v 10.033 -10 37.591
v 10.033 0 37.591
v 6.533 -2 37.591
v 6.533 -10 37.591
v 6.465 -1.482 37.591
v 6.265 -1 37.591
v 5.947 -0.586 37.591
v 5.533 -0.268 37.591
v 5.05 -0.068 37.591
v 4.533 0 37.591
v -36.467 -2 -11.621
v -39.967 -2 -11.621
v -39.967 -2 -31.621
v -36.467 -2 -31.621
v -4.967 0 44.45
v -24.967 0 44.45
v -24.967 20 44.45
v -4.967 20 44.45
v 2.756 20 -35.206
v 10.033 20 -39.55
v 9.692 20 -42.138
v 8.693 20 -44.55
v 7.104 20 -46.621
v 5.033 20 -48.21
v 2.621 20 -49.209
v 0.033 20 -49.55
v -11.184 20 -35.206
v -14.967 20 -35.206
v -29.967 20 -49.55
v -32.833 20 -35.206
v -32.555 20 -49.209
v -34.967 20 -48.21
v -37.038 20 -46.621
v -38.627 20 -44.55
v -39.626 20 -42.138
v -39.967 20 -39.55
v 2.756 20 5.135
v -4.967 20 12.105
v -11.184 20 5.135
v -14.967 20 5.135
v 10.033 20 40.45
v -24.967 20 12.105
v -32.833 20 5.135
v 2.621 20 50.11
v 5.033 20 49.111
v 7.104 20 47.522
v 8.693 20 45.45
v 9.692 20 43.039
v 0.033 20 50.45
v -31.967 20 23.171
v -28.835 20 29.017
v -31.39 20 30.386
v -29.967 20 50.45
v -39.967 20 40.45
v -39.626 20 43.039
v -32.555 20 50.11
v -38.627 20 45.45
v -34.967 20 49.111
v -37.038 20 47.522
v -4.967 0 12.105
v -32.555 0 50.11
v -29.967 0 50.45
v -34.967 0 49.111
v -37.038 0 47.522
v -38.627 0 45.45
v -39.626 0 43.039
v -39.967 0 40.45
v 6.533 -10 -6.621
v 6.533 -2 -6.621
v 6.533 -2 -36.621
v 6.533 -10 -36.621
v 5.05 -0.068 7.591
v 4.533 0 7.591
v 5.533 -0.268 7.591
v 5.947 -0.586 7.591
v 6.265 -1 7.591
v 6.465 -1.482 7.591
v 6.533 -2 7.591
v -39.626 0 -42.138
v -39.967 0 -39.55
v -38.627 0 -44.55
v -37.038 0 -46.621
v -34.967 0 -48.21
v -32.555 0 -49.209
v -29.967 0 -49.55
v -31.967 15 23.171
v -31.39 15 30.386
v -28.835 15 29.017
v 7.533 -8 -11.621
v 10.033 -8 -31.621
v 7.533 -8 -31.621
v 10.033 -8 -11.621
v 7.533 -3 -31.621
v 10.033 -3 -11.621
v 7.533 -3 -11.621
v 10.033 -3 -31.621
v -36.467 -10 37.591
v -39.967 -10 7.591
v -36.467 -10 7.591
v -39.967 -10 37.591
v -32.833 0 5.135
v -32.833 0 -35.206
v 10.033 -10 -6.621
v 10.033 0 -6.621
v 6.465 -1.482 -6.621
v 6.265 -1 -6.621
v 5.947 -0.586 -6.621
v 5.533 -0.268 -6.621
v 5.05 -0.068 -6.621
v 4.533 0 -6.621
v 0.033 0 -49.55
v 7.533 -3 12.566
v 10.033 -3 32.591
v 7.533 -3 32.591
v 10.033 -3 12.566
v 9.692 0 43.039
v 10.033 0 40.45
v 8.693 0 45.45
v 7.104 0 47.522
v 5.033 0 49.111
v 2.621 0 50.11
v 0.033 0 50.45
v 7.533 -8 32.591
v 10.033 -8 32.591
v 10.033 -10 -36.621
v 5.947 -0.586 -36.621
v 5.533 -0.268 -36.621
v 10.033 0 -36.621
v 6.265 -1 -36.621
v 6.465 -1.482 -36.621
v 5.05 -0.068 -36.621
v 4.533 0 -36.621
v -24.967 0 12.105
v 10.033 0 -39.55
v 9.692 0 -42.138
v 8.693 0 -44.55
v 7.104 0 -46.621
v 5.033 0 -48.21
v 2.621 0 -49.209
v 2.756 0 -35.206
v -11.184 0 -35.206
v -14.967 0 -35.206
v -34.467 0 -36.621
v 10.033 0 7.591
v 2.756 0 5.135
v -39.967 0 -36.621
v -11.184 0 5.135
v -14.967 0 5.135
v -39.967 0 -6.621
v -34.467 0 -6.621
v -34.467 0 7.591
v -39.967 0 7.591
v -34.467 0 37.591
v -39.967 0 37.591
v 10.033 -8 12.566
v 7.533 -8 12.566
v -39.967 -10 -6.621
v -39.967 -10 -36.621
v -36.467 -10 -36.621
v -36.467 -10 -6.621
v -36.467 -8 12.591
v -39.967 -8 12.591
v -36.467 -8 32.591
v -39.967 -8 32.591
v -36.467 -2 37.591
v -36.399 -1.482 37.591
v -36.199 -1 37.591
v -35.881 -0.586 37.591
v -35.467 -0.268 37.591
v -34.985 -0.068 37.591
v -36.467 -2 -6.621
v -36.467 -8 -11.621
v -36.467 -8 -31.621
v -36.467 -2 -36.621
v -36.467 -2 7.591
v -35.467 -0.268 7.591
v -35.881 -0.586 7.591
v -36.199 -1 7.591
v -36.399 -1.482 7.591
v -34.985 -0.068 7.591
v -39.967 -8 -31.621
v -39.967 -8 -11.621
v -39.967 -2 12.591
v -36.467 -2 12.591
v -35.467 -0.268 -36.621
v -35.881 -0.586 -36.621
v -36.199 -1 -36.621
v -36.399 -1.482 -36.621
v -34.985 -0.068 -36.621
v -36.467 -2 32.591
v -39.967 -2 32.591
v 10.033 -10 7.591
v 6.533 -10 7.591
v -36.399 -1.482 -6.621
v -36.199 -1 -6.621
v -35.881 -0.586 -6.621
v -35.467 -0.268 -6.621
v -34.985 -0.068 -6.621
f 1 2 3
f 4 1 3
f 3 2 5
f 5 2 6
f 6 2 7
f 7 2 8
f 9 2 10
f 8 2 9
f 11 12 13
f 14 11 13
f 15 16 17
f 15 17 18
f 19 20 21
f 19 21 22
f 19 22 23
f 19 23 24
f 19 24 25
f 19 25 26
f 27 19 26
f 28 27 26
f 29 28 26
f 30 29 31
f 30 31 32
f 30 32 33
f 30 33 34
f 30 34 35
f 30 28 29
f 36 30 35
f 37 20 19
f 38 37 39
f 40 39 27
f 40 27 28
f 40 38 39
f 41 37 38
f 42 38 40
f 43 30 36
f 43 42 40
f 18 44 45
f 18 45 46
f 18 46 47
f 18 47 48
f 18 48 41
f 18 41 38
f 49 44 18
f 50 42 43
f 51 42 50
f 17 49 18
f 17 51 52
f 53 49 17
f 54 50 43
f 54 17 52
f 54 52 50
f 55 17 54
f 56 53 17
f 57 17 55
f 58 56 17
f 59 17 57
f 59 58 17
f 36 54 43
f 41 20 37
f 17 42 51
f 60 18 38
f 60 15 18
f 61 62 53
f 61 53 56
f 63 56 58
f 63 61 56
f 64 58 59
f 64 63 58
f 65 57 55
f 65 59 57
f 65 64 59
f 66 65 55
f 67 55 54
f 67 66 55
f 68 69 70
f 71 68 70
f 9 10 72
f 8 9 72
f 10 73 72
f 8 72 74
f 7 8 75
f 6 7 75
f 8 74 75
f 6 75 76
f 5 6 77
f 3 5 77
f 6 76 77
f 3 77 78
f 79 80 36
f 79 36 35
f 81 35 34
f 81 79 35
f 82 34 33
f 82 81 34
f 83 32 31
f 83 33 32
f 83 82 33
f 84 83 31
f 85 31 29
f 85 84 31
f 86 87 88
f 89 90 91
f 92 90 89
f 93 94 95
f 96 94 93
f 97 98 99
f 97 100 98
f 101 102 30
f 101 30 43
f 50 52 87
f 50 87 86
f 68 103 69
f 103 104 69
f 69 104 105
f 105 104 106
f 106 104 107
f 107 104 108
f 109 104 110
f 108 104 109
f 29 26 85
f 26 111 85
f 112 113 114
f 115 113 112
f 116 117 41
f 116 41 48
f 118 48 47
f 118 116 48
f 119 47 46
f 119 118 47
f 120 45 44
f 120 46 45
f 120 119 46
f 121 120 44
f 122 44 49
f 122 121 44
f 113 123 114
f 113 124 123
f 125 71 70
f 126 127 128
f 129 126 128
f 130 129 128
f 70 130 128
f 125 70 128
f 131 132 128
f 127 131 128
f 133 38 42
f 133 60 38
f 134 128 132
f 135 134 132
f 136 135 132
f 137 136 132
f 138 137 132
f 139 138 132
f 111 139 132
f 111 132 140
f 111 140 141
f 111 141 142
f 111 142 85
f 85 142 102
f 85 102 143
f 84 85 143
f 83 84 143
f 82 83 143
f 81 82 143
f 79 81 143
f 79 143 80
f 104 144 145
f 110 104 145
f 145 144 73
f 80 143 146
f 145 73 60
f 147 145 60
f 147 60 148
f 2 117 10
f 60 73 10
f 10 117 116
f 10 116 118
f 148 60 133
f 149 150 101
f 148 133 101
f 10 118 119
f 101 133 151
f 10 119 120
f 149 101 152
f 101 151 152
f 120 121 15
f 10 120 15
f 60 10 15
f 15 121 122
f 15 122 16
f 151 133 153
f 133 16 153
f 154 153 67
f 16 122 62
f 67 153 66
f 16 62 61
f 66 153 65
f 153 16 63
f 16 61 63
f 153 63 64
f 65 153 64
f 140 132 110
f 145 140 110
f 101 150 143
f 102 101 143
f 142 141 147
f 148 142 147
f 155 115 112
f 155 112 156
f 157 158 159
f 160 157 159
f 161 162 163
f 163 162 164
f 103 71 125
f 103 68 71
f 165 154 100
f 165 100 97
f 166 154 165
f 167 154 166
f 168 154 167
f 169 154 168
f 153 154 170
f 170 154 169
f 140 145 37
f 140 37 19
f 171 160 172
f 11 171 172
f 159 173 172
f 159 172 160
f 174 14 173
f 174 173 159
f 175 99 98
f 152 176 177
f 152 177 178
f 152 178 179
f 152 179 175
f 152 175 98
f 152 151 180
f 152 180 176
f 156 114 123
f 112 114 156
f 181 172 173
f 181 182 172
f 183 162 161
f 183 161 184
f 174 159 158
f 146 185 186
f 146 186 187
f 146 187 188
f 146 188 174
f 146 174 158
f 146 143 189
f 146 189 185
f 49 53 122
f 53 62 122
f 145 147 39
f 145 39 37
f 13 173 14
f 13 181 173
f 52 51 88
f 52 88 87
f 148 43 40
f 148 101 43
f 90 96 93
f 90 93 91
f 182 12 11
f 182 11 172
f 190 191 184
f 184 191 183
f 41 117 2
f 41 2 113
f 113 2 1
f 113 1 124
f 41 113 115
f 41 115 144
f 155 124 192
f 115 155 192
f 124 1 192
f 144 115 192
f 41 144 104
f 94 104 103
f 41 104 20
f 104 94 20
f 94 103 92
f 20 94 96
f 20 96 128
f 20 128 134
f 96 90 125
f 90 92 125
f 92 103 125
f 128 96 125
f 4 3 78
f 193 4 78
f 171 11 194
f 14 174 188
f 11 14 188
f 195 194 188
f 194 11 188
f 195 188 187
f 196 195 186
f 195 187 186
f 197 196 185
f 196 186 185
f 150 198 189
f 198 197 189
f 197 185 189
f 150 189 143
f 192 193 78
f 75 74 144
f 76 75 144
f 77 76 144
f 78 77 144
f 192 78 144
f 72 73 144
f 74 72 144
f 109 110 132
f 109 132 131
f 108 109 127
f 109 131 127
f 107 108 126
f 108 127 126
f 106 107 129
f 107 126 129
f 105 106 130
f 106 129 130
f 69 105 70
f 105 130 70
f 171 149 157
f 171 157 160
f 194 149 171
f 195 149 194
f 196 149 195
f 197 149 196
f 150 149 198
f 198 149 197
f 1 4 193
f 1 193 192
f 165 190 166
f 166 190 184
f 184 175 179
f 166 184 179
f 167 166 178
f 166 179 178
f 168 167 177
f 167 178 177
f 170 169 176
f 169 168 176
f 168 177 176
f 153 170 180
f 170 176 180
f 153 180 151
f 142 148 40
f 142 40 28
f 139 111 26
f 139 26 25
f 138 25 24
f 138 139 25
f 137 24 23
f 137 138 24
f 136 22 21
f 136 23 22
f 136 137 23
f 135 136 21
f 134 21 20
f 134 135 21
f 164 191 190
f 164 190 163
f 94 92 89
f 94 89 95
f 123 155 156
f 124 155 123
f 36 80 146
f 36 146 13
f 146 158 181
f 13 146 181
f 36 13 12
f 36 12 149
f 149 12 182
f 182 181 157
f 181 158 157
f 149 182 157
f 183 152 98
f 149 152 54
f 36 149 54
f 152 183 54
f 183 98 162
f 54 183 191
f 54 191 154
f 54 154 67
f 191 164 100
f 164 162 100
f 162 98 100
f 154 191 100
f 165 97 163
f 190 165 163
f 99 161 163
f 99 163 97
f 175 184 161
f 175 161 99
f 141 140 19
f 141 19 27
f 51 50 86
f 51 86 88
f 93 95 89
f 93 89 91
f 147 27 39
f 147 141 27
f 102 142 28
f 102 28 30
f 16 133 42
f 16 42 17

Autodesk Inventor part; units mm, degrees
ref_plane "YZ Plane" through (0, 0, 0) normal (1, 0, 0) x (0, 1, 0)
ref_plane "XZ Plane" through (0, 0, 0) normal (0, 1, 0) x (-1, 0, 0)
ref_plane "XY Plane" through (0, 0, 0) normal (0, 0, 1) x (1, 0, 0)
sketch "Sketch1" plane through (0, 0, 0) normal (0, 1, 0) x (-1, 0, 0)
  line L0 (29.9672, 50.4505) -> (-0.0328, 50.4505)
  line L1 (-10.0328, 40.4505) -> (-10.0328, -39.5495)
  line L2 (-0.0328, -49.5495) -> (29.9672, -49.5495)
  line L3 (39.9672, -39.5495) -> (39.9672, 40.4505)
  line L4 (24.9672, 44.4505) -> (4.9672, 44.4505)
  line L5 (4.9672, 44.4505) -> (4.9672, 12.105)
  line L6 (4.9672, 12.105) -> (24.9672, 12.105)
  line L7 (24.9672, 12.105) -> (24.9672, 44.4505)
  line L8 (32.8329, 5.1351) -> (14.9672, 5.1351)
  line L9 (14.9672, 5.1351) -> (14.9672, -35.2063)
  line L10 (14.9672, -35.2063) -> (32.8329, -35.2063)
  line L11 (32.8329, -35.2063) -> (32.8329, 5.1351)
  line L12 (11.1837, 5.1351) -> (-2.7562, 5.1351)
  line L13 (-2.7562, 5.1351) -> (-2.7562, -35.2063)
  line L14 (-2.7562, -35.2063) -> (11.1837, -35.2063)
  line L15 (11.1837, -35.2063) -> (11.1837, 5.1351)
  arc A0 (-0.0328, 50.4505) -> (-10.0328, 40.4505) centre (-0.0328, 40.4505) ccw
  arc A1 (39.9672, 40.4505) -> (29.9672, 50.4505) centre (29.9672, 40.4505) ccw
  arc A2 (29.9672, -49.5495) -> (39.9672, -39.5495) centre (29.9672, -39.5495) ccw
  arc A3 (-10.0328, -39.5495) -> (-0.0328, -49.5495) centre (-0.0328, -39.5495) ccw
  point P0 (0, 0)
  point P1 (39.9672, 50.4505)
  point P2 (-10.0328, -49.5495)
  point P3 (39.9672, -49.5495)
  dimension "d1" = 100
  dimension "d2" = 50
  dimension "d3" = 15
  dimension "d4" = 15
  dimension "d6" = 6
  dimension "d7" = 10
  dimension "d8" = 10
  dimension "d9" = 10
  dimension "d10" = 10
extrude "Extrusion1" add sketch "Sketch1" along normal blind 20
sketch "Sketch2" plane through (0, 0, 0) normal (0, -1, 0) x (1, 0, 0)
  line L0 (10.0328, 40.4505) -> (10.0328, -39.5495) projected
  line L1 (10.0328, 37.5913) -> (6.5328, 37.5913)
  line L2 (6.5328, 37.5913) -> (6.5328, 7.5913)
  line L3 (6.5328, 7.5913) -> (10.0328, 7.5913)
  line L4 (10.0328, 7.5913) -> (10.0328, 37.5913)
  line L5 (10.0328, -6.6206) -> (6.5328, -6.6206)
  line L6 (6.5328, -6.6206) -> (6.5328, -36.6206)
  line L7 (6.5328, -36.6206) -> (10.0328, -36.6206)
  line L8 (10.0328, -36.6206) -> (10.0328, -6.6206)
  arc A0 (10.0328, 40.4505) -> (0.0328, 50.4505) centre (0.0328, 40.4505) ccw projected
  arc A1 (0.0328, -49.5495) -> (10.0328, -39.5495) centre (0.0328, -39.5495) ccw projected
  line L9 (-39.9672, -39.5495) -> (-39.9672, 40.4505) projected
  line L10 (-39.9672, 37.5913) -> (-36.4672, 37.5913)
  line L11 (-36.4672, 37.5913) -> (-36.4672, 7.5913)
  line L12 (-36.4672, 7.5913) -> (-39.9672, 7.5913)
  line L13 (-39.9672, 7.5913) -> (-39.9672, 37.5913)
  line L14 (-39.9672, -6.6206) -> (-36.4672, -6.6206)
  line L15 (-36.4672, -6.6206) -> (-36.4672, -36.6206)
  line L16 (-36.4672, -36.6206) -> (-39.9672, -36.6206)
  line L17 (-39.9672, -36.6206) -> (-39.9672, -6.6206)
  point P0 (0, 0)
  point P1 (7.1038, 47.5215)
  point P2 (8.2828, 37.5913)
  point P3 (7.1038, -46.6206)
  point P4 (8.2828, 7.5913)
  point P5 (-34.5818, 22.0482)
  point P6 (-38.0818, -7.9518)
  point P7 (-37.5107, 76.1904)
  point P8 (-36.4672, -21.6206)
  point P9 (-39.9672, -21.6206)
  dimension "d13" = 3.5
  dimension "d14" = 3.5
  dimension "d15" = 10
  dimension "d16" = 10
  dimension "d17" = 30
  dimension "d18" = 30
  dimension "d22" = 3.5
  dimension "d23" = 3.5
extrude "Extrusion2" add sketch "Sketch2" along normal blind 10
fillet "Fillet1" radius 2 4 edges at (6.5328, 0, 22.5913) (6.5328, 0, -21.6206) (-36.4672, 0, 22.5913) (-36.4672, 0, -21.6206)
sketch "Sketch3" plane through (10.0328, 0, -39.5495) normal (1, 0, 0) x (0, 0, -1)
  line L0 (-72.1408, -3) -> (-52.1157, -3)
  line L1 (-52.1157, -3) -> (-52.1157, -8)
  line L2 (-52.1157, -8) -> (-72.1408, -8)
  line L3 (-72.1408, -8) -> (-72.1408, -3)
  line L4 (-77.1408, 0) -> (-77.1408, -10) projected
  line L5 (-47.1408, 0) -> (-47.1408, -10) projected
  line L6 (-77.1408, 0) -> (-47.1408, 0) projected
  line L7 (-27.9289, -3) -> (-7.9289, -3)
  line L8 (-7.9289, -3) -> (-7.9289, -8)
  line L9 (-7.9289, -8) -> (-27.9289, -8)
  line L10 (-27.9289, -8) -> (-27.9289, -3)
  line L11 (-32.9289, 0) -> (-32.9289, -10) projected
  line L12 (-2.9289, 0) -> (-2.9289, -10) projected
  point P0 (-39.5495, 0)
  point P1 (-77.1408, -5)
  point P2 (-52.1157, -5.5)
  point P3 (-47.1408, -5)
  point P4 (-32.9289, -5)
  point P5 (-27.9289, -5.5)
  point P6 (-2.9289, -5)
  point P7 (-7.9289, -5.5)
  dimension "d27" = 5
  dimension "d28" = 5
  dimension "d29" = 5
  dimension "d30" = 3
  dimension "d31" = 5
  dimension "d33" = 5
extrude "Extrusion3" cut sketch "Sketch3" against normal blind 2.5
sketch "Sketch4" plane through (0, 20, 0) normal (0, 1, 0) x (1, 0, 0)
  point P0 (0, 0)
sketch "Sketch5" plane through (0, 20, 0) normal (0, 1, 0) x (1, 0, 0)
  line L0 (-31.3896, -30.3859) -> (-31.9666, -23.1707)
  line L1 (-31.9666, -23.1707) -> (-28.8346, -29.0171)
  line L2 (-28.8346, -29.0171) -> (-31.3896, -30.3859)
  point P0 (0, 0)
extrude "Extrusion4" cut sketch "Sketch5" against normal blind 5
sketch "Sketch6" plane through (-39.9672, 0, 40.4505) normal (-1, 0, 0) x (0, 0, 1)
  line L0 (-47.0711, -2) -> (-77.0711, -2) projected
  line L1 (-72.0711, -2) -> (-52.0711, -2)
  line L2 (-52.0711, -2) -> (-52.0711, -8)
  line L3 (-52.0711, -8) -> (-72.0711, -8)
  line L4 (-72.0711, -8) -> (-72.0711, -2)
  line L5 (-47.0711, 0) -> (-47.0711, -10) projected
  line L6 (-77.0711, 0) -> (-77.0711, -10) projected
  line L7 (-47.0711, -10) -> (-77.0711, -10) projected
  line L8 (-2.8592, -2) -> (-32.8592, -2) projected
  line L9 (-27.8843, -8) -> (-7.8592, -8) projected
  line L10 (-27.8592, -2) -> (-7.8592, -2)
  line L11 (-7.8592, -2) -> (-7.8592, -8)
  line L12 (-7.8592, -8) -> (-27.8592, -8)
  line L13 (-27.8592, -8) -> (-27.8592, -2)
  line L14 (-32.8592, 0) -> (-32.8592, -10) projected
  point P0 (-40.4505, 0)
  point P1 (-47.0711, -5)
  point P2 (-77.0711, -5)
  point P3 (-32.8592, -5)
  point P4 (-27.8592, -5)
  point P5 (-7.8592, -2)
  dimension "d38" = 5
  dimension "d39" = 5
  dimension "d40" = 2
  dimension "d41" = 5
extrude "Extrusion5" cut sketch "Sketch6" against normal blind 5 contours L2 L3 L4 L0 | L11 L9 L13 L8
properties part number "Testing"
